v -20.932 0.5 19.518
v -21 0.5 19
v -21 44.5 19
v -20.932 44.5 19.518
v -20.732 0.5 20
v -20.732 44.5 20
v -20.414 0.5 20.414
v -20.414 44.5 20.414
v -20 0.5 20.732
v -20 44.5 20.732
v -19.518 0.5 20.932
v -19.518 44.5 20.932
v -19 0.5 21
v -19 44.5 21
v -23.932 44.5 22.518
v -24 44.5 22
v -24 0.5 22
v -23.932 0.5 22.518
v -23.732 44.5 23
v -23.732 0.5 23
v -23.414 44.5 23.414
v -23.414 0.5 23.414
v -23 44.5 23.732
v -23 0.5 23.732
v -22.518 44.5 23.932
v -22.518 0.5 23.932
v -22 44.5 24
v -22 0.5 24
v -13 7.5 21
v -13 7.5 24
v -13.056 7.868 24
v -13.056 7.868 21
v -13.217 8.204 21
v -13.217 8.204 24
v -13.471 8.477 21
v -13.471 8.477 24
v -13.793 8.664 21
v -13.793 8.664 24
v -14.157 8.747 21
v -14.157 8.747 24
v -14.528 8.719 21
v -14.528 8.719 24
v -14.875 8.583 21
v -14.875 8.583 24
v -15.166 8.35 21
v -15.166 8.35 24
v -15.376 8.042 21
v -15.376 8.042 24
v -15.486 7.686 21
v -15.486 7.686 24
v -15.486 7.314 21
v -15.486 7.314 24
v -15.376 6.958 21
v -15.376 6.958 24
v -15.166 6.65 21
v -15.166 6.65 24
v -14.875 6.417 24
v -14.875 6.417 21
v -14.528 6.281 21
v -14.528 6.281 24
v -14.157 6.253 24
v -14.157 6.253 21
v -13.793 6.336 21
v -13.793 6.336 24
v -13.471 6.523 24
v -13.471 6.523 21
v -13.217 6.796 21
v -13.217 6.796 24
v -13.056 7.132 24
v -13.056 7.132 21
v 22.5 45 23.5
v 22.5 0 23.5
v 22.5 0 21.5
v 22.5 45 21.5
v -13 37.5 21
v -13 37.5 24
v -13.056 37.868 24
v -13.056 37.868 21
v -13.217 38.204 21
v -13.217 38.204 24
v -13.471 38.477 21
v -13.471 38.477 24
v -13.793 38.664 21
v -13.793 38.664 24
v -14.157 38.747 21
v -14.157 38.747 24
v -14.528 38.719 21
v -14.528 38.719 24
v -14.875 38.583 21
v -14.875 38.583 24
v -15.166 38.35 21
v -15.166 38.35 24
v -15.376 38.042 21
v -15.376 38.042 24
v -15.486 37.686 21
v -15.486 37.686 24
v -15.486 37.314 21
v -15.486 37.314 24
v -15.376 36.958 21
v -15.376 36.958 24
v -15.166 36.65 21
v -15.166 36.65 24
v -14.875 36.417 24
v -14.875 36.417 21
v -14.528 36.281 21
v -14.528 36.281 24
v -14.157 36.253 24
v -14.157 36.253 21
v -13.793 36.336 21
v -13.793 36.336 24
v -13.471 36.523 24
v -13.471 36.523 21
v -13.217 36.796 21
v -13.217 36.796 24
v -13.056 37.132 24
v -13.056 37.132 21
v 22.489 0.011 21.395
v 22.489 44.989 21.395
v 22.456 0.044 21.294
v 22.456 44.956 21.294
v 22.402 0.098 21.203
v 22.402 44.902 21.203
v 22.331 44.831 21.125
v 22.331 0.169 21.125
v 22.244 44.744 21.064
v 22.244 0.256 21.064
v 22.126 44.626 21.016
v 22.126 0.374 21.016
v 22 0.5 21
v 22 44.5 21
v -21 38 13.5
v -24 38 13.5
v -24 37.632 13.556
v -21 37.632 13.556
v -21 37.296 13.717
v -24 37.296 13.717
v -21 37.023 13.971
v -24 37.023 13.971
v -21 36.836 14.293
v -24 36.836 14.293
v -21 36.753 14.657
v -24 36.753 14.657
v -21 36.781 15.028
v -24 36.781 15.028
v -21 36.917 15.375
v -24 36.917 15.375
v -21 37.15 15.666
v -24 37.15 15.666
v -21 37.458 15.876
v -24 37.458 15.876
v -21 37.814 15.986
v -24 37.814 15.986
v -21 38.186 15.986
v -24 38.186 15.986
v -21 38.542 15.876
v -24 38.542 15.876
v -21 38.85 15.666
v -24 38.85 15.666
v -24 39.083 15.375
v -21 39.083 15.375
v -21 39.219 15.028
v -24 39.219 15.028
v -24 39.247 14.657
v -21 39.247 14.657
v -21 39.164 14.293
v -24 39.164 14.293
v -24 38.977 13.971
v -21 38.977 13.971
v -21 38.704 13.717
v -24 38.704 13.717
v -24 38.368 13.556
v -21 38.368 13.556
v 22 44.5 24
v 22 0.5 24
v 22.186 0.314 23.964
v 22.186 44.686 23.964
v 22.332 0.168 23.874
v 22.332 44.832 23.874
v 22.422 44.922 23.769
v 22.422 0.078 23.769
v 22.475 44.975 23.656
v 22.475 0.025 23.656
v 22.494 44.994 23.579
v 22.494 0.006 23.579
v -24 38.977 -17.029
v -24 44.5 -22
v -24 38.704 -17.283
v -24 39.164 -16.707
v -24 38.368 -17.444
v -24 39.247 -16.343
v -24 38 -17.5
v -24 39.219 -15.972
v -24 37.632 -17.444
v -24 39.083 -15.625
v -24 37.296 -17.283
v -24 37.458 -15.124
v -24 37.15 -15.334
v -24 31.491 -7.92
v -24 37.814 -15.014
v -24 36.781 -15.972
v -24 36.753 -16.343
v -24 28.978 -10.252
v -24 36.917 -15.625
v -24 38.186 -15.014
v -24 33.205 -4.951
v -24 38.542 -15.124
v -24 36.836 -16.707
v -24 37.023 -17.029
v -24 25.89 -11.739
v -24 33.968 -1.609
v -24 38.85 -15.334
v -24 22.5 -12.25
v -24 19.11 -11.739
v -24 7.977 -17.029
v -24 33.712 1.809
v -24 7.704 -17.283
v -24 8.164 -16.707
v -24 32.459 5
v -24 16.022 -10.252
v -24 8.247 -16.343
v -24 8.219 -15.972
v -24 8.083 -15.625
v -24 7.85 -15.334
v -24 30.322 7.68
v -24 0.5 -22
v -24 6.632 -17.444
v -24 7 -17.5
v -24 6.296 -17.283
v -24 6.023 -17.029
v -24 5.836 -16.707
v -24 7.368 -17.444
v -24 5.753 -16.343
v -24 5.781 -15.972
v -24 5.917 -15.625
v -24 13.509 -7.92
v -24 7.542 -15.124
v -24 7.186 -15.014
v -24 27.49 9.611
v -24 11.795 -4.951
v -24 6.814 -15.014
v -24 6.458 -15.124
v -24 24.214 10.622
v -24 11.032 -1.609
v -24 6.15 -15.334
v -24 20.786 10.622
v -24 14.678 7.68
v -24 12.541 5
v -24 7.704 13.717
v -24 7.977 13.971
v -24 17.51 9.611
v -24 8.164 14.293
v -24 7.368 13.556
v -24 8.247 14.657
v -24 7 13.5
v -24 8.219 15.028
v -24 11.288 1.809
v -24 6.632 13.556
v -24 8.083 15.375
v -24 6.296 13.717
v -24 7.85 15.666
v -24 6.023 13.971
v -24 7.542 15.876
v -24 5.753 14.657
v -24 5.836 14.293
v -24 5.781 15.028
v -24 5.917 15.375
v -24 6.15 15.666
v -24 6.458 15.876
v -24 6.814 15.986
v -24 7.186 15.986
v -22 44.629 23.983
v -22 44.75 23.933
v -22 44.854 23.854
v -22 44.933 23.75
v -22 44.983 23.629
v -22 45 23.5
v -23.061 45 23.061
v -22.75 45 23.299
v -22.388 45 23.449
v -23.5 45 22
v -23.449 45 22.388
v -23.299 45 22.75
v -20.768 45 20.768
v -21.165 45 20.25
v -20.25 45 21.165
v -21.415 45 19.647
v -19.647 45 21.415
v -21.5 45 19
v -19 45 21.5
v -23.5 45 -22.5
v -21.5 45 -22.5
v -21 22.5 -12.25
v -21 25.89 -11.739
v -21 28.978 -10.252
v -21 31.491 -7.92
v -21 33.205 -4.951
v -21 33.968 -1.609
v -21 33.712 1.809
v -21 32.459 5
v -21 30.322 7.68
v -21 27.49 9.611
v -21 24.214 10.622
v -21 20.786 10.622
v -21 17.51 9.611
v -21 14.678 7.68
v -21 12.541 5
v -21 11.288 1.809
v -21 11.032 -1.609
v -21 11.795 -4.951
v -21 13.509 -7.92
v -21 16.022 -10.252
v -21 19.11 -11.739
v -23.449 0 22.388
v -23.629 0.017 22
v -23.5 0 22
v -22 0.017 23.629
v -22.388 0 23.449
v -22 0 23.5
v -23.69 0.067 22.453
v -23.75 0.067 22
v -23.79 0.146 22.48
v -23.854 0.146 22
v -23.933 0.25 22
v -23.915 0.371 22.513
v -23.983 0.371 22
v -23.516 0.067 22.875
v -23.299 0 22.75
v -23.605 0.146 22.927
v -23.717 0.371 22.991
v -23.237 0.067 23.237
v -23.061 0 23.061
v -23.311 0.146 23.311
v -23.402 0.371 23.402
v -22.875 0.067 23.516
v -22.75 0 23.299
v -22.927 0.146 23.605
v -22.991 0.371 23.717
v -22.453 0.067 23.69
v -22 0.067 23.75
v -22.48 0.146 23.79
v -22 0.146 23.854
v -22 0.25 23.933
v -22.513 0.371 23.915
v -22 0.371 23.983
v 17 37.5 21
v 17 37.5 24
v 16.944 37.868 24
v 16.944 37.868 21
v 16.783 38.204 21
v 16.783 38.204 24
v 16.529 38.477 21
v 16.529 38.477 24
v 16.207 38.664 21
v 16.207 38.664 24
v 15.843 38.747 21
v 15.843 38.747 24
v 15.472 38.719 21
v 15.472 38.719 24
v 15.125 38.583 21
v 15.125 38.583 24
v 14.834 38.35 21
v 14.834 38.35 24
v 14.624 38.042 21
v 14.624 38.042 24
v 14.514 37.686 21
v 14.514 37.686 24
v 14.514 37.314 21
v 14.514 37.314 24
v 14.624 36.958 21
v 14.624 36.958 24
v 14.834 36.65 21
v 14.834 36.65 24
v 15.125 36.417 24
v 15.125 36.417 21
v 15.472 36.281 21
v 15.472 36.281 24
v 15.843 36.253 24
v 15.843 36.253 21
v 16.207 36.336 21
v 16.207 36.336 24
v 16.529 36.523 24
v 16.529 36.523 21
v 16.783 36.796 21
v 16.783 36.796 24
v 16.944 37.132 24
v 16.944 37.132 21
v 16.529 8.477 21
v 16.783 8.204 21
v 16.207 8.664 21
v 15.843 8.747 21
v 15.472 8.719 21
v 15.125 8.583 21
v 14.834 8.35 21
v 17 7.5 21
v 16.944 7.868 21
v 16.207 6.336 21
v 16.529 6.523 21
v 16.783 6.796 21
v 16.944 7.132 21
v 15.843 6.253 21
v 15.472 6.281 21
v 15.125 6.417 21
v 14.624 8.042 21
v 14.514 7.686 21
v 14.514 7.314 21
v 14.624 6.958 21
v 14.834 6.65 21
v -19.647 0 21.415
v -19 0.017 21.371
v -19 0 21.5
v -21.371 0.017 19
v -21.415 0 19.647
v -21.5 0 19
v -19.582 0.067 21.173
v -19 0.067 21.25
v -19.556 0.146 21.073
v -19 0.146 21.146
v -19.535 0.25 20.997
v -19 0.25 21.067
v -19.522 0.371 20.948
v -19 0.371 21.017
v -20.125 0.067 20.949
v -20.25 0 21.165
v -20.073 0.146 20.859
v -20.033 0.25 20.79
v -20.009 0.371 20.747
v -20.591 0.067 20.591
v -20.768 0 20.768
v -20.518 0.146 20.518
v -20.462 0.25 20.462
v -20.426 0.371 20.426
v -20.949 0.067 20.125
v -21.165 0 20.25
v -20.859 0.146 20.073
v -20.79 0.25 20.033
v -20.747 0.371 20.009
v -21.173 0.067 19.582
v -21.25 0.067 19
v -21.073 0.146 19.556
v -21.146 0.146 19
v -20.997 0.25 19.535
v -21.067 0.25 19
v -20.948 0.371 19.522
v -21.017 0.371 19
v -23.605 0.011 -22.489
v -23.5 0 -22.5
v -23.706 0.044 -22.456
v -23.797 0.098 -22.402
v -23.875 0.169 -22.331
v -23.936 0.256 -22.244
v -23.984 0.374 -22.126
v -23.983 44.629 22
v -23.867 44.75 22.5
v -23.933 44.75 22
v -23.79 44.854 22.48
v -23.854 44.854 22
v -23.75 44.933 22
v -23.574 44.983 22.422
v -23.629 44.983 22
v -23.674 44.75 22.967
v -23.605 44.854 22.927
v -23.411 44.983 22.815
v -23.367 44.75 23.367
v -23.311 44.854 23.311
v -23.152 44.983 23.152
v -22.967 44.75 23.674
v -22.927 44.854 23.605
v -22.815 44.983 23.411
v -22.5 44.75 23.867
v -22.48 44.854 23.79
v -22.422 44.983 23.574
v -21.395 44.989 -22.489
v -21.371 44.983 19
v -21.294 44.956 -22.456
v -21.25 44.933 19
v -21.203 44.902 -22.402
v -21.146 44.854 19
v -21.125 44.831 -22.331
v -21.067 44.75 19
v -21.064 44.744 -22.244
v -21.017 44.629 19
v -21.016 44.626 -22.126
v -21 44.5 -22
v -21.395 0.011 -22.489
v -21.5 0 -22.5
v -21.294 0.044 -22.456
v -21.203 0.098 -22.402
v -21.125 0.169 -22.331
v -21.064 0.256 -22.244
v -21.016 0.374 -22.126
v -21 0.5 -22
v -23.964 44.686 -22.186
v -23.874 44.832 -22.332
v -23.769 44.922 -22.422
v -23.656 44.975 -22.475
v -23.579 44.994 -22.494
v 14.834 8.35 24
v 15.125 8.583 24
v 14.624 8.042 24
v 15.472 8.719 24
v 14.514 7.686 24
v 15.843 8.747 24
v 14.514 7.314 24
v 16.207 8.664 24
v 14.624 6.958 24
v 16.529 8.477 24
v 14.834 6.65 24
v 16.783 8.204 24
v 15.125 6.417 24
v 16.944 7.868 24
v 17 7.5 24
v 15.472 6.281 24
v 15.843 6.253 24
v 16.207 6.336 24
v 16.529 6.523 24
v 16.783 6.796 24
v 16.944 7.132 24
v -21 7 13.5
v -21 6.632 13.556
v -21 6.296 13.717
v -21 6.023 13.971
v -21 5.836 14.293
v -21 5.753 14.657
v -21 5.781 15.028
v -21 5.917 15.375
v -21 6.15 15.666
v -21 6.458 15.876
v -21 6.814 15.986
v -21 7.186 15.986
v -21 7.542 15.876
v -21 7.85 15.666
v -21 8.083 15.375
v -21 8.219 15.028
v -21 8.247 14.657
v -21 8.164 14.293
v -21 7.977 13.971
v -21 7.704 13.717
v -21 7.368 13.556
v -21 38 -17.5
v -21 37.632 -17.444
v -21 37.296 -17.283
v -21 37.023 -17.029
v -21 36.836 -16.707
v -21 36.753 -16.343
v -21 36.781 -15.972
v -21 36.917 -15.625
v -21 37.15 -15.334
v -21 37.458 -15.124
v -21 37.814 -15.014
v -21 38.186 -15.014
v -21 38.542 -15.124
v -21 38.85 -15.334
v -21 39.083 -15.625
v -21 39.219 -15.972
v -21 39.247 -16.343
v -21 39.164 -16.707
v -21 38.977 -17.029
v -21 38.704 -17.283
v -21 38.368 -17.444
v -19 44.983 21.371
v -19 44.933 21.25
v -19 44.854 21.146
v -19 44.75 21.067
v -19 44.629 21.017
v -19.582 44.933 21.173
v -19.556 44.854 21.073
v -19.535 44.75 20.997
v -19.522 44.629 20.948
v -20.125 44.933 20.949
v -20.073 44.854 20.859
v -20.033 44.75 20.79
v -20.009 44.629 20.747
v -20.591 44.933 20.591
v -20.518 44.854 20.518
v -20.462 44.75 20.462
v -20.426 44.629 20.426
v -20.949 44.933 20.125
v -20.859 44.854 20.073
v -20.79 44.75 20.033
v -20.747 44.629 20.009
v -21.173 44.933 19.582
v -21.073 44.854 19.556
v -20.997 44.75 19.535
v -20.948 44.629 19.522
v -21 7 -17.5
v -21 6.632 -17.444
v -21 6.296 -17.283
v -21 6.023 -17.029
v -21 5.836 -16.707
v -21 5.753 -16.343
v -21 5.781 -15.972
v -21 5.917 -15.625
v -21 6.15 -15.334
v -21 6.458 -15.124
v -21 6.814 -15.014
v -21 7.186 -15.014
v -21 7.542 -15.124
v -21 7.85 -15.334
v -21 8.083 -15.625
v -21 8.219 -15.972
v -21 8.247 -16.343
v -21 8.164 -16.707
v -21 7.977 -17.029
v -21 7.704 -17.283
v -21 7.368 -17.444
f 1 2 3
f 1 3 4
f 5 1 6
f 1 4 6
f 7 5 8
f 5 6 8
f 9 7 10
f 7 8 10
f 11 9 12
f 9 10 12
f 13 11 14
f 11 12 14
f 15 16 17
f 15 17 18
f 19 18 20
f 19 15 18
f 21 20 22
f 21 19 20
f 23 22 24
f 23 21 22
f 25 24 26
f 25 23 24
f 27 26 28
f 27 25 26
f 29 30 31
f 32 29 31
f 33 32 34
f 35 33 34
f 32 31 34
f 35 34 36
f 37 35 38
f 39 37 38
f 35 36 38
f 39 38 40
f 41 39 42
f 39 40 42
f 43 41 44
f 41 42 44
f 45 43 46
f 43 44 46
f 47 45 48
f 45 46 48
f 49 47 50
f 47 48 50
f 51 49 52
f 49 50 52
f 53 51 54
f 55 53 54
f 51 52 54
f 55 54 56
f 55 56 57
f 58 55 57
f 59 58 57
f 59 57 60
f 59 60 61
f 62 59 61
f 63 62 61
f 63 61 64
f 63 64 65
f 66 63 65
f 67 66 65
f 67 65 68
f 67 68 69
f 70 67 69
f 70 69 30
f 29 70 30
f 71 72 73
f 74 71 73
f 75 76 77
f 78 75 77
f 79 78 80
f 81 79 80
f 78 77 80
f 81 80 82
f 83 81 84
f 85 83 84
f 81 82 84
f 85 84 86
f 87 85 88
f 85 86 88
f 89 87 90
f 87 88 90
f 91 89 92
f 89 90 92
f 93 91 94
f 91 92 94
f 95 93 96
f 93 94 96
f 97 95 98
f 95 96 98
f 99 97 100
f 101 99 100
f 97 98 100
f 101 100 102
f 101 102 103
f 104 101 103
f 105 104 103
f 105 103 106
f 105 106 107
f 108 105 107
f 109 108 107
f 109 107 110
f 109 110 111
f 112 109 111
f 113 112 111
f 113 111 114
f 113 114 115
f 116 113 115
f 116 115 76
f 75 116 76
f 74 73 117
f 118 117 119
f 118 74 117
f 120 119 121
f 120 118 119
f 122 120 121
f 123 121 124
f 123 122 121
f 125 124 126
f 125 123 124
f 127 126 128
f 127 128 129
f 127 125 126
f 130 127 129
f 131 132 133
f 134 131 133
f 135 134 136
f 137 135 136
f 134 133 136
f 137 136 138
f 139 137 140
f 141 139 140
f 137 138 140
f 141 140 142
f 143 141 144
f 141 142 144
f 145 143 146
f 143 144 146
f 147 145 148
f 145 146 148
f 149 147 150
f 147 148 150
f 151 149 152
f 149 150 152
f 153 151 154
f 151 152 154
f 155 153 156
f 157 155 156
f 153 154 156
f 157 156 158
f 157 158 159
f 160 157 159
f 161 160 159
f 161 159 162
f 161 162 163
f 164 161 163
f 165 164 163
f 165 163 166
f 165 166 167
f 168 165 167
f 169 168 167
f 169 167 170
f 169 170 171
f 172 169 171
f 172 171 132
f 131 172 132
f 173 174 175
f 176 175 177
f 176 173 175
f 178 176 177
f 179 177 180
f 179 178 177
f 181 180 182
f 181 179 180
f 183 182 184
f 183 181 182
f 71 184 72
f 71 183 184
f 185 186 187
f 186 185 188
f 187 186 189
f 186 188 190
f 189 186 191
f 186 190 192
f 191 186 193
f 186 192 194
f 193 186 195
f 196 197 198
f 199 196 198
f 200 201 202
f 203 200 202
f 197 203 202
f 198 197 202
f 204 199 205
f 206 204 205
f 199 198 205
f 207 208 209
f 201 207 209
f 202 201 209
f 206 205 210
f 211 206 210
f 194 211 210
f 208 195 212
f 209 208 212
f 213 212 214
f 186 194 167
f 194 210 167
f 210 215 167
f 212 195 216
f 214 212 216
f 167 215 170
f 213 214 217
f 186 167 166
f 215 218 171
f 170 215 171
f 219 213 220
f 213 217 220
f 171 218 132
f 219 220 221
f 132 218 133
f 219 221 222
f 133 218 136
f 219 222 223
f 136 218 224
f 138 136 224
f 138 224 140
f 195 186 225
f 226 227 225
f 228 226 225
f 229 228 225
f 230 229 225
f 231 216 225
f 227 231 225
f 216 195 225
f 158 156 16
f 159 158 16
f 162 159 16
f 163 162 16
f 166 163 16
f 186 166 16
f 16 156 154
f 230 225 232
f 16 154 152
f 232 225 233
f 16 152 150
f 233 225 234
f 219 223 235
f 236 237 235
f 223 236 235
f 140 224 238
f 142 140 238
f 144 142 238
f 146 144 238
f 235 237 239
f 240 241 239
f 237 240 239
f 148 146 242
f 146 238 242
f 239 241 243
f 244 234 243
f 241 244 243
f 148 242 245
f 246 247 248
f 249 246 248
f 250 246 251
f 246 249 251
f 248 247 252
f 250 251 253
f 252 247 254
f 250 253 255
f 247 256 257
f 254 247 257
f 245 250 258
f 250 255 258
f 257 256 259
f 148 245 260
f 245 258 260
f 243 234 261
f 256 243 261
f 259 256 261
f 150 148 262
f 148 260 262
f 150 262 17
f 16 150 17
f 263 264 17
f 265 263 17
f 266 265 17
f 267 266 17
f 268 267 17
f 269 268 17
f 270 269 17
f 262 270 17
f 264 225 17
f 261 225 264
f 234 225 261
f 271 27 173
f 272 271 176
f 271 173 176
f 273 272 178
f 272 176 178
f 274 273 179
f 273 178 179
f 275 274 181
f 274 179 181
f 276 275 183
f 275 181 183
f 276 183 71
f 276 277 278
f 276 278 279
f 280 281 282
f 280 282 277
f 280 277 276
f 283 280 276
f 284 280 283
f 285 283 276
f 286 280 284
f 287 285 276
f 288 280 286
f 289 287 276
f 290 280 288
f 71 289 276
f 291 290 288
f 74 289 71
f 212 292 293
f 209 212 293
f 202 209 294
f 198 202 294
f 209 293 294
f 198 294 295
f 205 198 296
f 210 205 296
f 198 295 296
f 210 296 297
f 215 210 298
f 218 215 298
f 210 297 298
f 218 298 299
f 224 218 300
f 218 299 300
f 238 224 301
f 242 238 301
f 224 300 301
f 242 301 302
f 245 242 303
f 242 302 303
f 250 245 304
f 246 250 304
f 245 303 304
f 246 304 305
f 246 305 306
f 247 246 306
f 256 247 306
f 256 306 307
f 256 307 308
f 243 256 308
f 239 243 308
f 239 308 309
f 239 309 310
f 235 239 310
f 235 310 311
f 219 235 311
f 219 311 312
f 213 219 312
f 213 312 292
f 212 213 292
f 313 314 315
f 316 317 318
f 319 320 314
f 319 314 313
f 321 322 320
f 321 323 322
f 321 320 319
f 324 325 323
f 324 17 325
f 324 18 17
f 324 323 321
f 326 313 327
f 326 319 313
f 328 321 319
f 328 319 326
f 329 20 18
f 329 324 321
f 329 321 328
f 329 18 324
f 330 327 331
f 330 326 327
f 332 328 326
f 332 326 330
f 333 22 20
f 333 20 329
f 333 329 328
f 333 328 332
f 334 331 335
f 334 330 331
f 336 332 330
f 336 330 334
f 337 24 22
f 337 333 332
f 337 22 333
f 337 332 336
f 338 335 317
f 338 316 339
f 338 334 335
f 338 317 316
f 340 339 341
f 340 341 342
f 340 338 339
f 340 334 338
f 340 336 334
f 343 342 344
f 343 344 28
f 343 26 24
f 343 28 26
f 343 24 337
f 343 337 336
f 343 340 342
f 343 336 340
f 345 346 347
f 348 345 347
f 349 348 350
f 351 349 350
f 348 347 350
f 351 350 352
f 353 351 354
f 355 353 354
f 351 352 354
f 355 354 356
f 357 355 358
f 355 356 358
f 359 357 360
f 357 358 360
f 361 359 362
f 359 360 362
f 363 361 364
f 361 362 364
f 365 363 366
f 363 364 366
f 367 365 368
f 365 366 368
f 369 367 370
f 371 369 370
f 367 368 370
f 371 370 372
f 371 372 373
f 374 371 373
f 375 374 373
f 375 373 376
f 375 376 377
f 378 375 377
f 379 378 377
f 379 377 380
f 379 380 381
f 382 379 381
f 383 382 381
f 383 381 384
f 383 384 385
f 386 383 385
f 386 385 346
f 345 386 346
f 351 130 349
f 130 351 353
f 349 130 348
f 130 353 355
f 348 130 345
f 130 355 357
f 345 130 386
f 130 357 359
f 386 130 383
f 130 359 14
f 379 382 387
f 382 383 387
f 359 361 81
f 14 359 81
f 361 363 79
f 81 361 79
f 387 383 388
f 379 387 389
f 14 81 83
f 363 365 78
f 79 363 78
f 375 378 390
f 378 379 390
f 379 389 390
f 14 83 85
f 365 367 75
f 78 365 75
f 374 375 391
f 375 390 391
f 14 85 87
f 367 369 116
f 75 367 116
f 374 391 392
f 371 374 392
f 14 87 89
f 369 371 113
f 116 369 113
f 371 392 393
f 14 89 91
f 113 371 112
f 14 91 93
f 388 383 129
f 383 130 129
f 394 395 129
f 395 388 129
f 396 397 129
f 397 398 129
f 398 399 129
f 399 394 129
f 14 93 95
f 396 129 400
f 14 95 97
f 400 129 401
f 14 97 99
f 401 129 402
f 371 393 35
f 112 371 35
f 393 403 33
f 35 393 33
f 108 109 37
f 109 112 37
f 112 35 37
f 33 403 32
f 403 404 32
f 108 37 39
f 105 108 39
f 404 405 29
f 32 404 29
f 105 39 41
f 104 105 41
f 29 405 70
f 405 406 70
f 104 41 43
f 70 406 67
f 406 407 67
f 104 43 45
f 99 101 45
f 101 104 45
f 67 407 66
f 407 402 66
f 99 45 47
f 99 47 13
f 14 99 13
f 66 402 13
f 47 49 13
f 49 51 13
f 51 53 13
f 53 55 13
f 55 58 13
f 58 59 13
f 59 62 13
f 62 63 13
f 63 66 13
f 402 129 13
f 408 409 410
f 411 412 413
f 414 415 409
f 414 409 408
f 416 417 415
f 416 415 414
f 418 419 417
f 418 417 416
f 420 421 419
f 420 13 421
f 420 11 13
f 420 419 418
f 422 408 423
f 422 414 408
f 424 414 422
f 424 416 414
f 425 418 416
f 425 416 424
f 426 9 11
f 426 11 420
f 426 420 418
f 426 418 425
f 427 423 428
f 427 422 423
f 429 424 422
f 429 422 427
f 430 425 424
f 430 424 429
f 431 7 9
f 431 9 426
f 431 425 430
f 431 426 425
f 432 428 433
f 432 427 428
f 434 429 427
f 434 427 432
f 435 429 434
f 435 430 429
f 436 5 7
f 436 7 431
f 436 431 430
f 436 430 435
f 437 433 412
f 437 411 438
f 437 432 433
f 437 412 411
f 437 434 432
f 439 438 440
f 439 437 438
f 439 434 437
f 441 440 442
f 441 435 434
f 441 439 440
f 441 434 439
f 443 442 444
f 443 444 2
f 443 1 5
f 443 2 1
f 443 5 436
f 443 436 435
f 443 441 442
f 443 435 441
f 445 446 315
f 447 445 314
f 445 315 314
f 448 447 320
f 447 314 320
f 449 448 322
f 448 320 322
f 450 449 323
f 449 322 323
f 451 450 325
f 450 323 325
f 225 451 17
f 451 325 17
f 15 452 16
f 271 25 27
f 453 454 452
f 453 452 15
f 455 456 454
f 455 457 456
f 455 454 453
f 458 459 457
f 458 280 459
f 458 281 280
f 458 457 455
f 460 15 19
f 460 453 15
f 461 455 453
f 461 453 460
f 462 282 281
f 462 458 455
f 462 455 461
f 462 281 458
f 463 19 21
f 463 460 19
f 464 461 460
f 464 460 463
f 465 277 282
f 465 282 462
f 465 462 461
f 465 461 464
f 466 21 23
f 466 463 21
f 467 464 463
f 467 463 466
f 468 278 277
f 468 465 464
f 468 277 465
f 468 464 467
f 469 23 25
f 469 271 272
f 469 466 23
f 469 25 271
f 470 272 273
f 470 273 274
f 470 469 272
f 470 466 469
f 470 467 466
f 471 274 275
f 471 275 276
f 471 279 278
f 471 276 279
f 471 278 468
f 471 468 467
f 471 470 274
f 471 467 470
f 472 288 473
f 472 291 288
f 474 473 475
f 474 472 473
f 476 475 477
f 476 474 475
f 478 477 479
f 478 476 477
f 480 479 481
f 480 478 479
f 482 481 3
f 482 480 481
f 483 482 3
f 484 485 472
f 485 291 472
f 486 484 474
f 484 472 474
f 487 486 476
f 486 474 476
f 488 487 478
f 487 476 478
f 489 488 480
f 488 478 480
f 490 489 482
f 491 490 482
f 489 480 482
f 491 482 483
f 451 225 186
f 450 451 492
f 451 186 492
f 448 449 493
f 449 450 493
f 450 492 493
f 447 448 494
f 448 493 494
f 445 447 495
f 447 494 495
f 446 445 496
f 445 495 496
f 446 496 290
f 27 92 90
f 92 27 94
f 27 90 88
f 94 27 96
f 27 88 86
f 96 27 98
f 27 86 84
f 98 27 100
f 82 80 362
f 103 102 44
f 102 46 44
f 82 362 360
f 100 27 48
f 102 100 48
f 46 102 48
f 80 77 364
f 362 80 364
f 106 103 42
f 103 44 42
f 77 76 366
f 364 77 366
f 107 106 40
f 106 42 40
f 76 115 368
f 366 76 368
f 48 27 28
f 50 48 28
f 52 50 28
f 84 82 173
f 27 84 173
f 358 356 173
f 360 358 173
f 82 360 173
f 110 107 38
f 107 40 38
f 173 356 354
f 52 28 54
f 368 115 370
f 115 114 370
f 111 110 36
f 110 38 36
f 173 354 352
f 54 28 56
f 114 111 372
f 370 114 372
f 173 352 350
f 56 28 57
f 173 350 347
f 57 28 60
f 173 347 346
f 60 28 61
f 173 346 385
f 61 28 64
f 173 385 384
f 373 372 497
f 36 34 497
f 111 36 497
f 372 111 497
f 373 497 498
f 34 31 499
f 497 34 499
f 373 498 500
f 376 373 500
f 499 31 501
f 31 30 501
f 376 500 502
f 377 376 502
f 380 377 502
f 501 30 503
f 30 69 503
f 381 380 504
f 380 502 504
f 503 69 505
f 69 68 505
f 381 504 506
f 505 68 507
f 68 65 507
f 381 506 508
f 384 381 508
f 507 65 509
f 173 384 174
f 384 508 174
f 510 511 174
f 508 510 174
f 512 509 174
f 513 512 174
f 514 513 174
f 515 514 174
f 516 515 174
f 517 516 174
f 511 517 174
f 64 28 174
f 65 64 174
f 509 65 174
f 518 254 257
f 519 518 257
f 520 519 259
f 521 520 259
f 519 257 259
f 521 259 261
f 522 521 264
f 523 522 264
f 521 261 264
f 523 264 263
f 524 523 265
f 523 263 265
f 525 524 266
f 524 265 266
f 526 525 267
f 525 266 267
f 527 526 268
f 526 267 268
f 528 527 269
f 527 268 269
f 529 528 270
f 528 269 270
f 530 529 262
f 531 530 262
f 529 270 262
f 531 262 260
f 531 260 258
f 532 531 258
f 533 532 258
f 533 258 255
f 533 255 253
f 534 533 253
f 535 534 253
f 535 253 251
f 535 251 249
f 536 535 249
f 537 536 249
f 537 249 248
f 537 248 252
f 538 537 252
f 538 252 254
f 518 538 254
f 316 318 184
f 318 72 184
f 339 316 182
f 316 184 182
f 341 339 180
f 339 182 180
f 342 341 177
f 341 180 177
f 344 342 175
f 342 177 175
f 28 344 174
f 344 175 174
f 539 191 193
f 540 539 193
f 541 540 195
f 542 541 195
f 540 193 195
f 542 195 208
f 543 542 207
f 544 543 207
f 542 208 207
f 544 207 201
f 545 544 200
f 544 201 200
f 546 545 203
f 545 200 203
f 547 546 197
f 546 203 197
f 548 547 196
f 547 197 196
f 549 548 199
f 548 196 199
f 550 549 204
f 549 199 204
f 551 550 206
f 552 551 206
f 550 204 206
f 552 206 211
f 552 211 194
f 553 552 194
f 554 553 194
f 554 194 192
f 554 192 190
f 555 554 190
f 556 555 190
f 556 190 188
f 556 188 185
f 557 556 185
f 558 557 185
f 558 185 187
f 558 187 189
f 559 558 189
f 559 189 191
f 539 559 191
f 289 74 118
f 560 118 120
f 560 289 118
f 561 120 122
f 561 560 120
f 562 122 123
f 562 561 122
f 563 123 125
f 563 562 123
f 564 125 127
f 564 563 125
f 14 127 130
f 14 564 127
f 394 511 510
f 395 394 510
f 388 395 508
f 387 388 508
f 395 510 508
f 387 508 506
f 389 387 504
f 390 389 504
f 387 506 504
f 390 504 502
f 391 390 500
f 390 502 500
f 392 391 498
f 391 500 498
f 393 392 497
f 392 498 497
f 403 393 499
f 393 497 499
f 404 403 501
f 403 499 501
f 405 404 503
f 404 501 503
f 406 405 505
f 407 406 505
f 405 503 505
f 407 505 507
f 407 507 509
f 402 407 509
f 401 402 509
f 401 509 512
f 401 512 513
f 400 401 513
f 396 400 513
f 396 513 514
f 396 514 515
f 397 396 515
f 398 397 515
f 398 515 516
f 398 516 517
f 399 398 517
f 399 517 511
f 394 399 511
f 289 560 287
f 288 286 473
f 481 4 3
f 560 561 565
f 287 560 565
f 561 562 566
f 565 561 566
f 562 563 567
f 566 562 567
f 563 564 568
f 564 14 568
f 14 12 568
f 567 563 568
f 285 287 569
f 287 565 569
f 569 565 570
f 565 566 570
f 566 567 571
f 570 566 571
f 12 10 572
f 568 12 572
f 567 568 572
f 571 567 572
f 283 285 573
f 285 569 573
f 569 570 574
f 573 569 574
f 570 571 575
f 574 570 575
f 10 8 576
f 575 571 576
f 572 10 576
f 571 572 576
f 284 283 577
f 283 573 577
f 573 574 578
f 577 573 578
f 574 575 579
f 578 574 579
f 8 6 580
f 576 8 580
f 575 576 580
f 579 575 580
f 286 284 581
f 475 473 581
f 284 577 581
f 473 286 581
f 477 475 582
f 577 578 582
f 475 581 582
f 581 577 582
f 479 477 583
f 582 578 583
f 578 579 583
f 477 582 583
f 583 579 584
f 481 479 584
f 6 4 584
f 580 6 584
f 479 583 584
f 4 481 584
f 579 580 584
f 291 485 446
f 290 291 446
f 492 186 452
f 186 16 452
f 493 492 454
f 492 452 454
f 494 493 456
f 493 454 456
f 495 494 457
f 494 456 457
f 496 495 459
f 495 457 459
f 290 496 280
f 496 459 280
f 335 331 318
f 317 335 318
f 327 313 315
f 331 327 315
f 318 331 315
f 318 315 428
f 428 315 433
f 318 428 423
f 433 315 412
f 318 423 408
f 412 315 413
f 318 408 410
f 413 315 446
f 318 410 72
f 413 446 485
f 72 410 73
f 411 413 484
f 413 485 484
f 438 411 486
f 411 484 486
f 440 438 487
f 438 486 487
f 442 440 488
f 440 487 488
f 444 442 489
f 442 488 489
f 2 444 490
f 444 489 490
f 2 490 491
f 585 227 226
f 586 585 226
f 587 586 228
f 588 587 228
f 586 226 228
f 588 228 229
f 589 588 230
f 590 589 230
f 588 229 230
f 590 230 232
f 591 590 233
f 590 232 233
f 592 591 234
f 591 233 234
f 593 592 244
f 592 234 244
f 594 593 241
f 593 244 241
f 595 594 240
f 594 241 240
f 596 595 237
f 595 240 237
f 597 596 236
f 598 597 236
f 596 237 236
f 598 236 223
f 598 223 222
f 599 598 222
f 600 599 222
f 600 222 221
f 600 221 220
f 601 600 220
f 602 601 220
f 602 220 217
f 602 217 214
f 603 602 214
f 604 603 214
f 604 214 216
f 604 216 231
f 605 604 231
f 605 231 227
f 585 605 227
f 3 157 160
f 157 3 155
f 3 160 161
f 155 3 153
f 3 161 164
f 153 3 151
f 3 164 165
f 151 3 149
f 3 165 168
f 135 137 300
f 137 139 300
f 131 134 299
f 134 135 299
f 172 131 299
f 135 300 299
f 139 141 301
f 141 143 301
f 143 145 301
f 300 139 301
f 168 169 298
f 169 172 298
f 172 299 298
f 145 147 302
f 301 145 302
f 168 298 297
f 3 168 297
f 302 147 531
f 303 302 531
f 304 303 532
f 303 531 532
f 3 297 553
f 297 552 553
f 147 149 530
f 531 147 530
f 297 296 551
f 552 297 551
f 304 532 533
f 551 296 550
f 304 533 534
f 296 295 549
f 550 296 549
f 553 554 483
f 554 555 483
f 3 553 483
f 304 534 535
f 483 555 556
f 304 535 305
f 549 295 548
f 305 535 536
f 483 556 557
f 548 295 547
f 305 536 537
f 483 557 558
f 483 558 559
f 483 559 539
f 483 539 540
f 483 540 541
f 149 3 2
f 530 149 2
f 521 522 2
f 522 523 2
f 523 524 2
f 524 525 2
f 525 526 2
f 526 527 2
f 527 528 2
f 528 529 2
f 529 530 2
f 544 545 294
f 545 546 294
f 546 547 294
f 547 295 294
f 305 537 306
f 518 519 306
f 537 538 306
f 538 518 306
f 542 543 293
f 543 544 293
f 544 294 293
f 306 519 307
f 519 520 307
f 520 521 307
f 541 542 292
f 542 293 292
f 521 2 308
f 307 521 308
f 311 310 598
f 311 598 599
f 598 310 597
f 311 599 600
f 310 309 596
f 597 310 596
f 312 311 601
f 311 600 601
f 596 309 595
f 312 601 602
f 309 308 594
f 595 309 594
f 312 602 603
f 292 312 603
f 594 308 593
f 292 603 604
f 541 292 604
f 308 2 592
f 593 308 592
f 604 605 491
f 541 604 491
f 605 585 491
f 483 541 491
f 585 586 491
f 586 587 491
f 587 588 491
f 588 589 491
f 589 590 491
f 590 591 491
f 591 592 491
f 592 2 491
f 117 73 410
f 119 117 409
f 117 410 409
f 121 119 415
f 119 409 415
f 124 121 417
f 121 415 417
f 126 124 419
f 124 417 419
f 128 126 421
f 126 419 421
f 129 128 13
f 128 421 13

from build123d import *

# Parameters (mm, degrees)
EXTRUDE_1_DEPTH     = 45
M3X0_5_1_D          = 2.5
FILLET_1_R          = 2
M3X0_5_2_D          = 2.5
FILLET_2_R          = 0.5
CUT_EXTRUDE_1_REACH = 69.032
SKETCH_6_R          = 11.5


with BuildPart() as part:
    # 草图1 → 拉伸-薄壁1 (new body)
    with BuildSketch(Plane(origin=(0, 0, 0), x_dir=(1, 0, 0), z_dir=(0, 1, 0))):
        Polygon((-24, 22.5), (-24, -24), (22.5, -24), (22.5, -21), (-21, -21), (-21, 22.5), align=None)
    extrude(amount=EXTRUDE_1_DEPTH)

    # M3x0.5 螺纹孔1 (through all)
    with Locations(Plane(origin=(-21, 38, 14.75), x_dir=(0, 0, 1), z_dir=(1, 0, 0))):
        with Locations((0, 0), (-31, 0), (-31, 31), (0, 31)):
            Hole(M3X0_5_1_D / 2)

    # 圆角1
    fillet_1_edges = [part.edges().sort_by_distance(p)[0] for p in [
        (-24, 22.5, 24),
        (-21, 22.5, 21),
    ]]
    fillet(fillet_1_edges, radius=FILLET_1_R)

    # M3x0.5 螺纹孔2 (through all)
    with Locations(Plane(origin=(-14.25, 37.5, 21), x_dir=(-1, 0, 0), z_dir=(0, 0, -1))):
        with Locations((0, 0), (0, -30), (-30, -30), (-30, 0)):
            Hole(M3X0_5_2_D / 2)

    # 圆角2
    fillet_2_edges = [part.edges().sort_by_distance(p)[0] for p in [
        (22.5, 22.5, 24),
        (-21, 45, -1.75),
        (-24, 45, -0.25),
        (0.25, 0, 24),
        (0.25, 45, 24),
        (1.75, 0, 21),
        (-23.414213562, 0, 23.414213562),
        (1.75, 45, 21),
        (-23.414213562, 45, 23.414213562),
        (-20.414213562, 0, 20.414213562),
        (-20.414213562, 45, 20.414213562),
        (-24, 0, -0.25),
        (-21, 0, -1.75),
        (-24, 22.5, -22.5),
        (-21, 22.5, -22.5),
        (22.5, 22.5, 21),
    ]]
    fillet(fillet_2_edges, radius=FILLET_2_R)

    # 草图6 → 切除-拉伸1 (cut, up to next)
    with BuildSketch(Plane(origin=(-21, 0, 0), x_dir=(0, 0, -1), z_dir=(1, 0, 0)), mode=Mode.PRIVATE) as cut_extrude_1_sk1:
        with Locations((0.75, 22.5)):
            Circle(SKETCH_6_R)
    cut_extrude_1_tool1 = extrude(cut_extrude_1_sk1.sketch, amount=-CUT_EXTRUDE_1_REACH, mode=Mode.PRIVATE) & part.part
    add(cut_extrude_1_tool1.solids().sort_by_distance((-21, 22.5, -0.75))[0], mode=Mode.SUBTRACT)


solid = part.part
